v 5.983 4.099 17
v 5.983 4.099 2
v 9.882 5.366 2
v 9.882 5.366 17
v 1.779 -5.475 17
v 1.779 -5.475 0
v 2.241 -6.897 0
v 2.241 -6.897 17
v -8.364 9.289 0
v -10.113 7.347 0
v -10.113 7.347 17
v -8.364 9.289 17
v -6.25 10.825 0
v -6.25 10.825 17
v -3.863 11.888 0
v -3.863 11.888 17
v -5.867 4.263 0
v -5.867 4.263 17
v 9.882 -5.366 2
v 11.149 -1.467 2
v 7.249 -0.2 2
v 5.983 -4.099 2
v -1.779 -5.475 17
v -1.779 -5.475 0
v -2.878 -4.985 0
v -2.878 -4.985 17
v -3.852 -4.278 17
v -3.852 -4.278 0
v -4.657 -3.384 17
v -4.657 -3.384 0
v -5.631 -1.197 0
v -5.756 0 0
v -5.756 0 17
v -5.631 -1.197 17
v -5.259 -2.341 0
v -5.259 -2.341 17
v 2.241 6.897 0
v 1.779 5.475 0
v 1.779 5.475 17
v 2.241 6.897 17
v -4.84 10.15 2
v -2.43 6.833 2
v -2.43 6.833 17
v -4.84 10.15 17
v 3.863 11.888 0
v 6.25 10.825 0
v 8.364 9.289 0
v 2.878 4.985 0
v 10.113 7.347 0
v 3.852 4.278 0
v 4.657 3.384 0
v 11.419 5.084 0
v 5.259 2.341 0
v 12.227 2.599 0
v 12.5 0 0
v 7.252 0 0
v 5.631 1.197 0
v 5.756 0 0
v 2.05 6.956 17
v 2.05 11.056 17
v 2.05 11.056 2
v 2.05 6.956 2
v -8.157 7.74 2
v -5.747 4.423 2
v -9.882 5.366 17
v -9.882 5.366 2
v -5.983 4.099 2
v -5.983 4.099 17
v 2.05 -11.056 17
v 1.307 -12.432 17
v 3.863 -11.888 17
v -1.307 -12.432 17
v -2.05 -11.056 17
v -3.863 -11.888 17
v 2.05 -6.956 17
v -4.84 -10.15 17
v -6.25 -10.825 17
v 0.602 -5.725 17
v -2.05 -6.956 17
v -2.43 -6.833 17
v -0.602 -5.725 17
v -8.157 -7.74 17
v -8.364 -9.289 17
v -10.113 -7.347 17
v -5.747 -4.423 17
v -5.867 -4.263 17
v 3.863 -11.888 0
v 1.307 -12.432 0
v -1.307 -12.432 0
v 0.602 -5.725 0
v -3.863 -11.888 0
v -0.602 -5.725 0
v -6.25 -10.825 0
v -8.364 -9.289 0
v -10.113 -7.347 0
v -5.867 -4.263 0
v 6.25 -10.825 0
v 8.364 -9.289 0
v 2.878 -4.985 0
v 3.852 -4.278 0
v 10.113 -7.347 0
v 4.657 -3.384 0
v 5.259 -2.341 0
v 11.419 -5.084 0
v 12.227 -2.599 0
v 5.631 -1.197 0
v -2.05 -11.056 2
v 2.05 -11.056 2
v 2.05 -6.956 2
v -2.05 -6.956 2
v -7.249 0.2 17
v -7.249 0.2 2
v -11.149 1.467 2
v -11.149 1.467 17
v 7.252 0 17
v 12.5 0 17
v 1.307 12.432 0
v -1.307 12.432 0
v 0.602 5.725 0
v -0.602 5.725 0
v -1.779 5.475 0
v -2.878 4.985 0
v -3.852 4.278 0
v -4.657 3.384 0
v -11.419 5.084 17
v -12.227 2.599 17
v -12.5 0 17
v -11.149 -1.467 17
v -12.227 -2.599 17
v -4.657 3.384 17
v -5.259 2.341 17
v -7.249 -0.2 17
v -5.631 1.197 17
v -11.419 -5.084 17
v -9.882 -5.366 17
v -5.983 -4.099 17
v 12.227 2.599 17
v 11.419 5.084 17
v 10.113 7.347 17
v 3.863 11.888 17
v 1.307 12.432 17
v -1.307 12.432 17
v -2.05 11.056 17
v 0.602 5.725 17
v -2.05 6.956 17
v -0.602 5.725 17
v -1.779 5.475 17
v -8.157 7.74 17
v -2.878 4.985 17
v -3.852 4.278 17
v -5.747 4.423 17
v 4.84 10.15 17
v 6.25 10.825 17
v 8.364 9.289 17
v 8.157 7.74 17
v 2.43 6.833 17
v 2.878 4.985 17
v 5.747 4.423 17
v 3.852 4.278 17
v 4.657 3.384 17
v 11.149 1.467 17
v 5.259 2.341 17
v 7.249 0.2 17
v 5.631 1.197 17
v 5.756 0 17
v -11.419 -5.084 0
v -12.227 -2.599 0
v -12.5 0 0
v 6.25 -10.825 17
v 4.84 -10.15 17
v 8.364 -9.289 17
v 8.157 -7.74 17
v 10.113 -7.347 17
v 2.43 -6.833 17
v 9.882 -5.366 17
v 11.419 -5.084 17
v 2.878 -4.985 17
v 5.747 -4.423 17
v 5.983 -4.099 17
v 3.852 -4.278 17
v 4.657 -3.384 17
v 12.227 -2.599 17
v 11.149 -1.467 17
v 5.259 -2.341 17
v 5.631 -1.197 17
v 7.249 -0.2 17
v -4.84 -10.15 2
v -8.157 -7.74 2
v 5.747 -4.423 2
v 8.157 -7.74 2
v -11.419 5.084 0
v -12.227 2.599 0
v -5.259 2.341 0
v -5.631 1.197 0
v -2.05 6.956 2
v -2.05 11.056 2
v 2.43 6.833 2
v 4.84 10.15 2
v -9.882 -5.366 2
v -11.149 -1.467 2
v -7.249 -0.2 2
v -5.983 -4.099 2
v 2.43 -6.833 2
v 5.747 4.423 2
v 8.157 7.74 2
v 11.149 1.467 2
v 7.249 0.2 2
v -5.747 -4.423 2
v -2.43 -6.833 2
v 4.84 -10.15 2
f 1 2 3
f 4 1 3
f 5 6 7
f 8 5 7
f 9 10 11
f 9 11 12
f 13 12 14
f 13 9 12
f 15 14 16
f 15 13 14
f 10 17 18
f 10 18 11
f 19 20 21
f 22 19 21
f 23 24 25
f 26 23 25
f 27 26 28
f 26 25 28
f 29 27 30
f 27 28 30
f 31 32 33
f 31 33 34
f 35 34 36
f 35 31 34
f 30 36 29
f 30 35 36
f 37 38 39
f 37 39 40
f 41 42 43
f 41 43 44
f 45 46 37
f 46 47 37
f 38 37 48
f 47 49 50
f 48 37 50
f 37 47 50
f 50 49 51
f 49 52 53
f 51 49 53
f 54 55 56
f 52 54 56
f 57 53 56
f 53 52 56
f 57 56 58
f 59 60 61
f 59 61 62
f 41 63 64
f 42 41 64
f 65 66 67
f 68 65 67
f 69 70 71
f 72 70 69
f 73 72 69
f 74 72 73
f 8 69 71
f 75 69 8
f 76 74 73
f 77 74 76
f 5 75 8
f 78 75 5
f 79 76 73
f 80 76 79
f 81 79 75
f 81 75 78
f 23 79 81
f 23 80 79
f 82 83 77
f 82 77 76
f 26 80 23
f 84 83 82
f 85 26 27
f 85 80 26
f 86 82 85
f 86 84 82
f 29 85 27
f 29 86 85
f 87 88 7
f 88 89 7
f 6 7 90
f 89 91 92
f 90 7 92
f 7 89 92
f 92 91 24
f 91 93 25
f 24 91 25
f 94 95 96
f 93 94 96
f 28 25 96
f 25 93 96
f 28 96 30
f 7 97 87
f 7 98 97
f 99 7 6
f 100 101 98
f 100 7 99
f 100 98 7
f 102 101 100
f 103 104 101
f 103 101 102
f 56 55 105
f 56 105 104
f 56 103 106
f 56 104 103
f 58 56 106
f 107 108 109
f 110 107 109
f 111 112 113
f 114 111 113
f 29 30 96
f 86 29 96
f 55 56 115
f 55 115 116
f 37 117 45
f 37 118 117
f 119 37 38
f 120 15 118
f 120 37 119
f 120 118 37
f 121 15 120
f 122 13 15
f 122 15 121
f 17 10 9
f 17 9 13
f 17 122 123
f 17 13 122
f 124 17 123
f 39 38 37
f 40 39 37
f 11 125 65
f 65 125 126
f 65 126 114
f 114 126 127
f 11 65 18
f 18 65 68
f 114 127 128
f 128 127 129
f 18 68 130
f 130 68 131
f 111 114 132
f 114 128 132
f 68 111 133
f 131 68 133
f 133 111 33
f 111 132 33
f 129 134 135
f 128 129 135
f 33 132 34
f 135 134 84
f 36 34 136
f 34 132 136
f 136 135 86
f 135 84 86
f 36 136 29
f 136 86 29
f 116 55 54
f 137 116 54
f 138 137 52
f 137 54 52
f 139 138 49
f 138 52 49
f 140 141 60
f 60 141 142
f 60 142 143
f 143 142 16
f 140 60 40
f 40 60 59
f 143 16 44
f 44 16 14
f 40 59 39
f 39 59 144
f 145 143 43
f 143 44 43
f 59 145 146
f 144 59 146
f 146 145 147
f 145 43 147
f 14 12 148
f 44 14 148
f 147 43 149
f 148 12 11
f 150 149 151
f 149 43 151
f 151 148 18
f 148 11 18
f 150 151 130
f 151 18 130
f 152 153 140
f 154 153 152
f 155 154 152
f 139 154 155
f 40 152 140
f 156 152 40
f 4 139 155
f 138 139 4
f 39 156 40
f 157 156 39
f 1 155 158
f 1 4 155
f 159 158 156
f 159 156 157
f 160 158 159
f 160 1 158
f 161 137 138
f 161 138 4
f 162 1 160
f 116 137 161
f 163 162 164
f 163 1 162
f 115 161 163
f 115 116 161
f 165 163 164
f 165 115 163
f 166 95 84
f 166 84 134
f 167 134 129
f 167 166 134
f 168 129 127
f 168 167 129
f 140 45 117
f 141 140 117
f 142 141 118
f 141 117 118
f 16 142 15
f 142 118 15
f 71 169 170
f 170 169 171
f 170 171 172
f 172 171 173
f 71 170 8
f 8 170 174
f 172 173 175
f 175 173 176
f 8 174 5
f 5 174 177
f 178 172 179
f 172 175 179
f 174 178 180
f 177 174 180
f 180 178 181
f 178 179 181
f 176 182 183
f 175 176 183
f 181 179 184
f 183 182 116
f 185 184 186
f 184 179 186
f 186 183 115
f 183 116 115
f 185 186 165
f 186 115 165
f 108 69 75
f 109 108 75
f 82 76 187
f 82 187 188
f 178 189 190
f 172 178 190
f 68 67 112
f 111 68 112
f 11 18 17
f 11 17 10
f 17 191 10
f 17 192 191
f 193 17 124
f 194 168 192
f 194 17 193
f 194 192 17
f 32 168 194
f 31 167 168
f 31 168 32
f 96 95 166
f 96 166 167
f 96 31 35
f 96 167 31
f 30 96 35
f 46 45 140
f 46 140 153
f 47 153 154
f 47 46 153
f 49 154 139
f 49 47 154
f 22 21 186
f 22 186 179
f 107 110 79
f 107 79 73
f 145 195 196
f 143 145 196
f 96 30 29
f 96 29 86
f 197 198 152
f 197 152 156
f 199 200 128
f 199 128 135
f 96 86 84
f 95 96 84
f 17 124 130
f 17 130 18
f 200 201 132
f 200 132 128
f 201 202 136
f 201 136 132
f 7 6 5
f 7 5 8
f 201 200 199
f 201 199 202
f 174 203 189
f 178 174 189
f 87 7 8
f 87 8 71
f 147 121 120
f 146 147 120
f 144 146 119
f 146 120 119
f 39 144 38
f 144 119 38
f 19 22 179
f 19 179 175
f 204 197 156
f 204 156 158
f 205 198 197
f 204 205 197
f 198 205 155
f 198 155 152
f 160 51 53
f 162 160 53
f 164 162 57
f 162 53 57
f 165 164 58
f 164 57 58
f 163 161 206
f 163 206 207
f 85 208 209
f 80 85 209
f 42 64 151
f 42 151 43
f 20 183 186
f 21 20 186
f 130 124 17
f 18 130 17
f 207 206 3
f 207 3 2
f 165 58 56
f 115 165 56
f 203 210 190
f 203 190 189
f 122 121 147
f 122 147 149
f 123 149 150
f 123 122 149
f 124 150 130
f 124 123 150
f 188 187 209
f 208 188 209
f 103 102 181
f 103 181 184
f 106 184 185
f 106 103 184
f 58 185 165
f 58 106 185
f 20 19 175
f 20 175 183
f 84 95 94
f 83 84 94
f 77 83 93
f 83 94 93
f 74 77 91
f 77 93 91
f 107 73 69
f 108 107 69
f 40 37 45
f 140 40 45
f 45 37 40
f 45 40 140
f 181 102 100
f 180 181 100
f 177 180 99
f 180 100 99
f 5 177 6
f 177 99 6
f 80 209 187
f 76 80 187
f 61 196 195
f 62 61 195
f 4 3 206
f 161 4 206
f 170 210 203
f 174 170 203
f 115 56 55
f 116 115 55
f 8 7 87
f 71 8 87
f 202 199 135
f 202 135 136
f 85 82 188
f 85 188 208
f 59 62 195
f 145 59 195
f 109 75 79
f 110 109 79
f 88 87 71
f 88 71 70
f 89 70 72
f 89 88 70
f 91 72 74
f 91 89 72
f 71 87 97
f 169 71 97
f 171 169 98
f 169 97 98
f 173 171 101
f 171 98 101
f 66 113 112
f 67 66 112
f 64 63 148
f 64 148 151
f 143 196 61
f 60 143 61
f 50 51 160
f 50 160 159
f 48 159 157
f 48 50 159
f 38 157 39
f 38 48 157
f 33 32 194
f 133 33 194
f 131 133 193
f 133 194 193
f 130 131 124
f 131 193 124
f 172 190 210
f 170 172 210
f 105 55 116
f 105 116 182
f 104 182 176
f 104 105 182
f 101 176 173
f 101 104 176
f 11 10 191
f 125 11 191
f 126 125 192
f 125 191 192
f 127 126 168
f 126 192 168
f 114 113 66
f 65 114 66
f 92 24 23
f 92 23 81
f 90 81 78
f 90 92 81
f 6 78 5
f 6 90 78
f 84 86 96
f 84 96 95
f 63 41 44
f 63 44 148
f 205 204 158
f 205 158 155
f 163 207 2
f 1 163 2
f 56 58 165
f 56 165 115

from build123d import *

# Parameters (mm, degrees)
F1_DEPTH = 17
F2_DEPTH = 2


with BuildPart() as f1:
    # F0 (on Top) → F1 (new body)
    with BuildSketch(Plane.XY):
        with BuildLine():
            Line((-9.8818381012, 5.3663013937), (-5.9825063844, 4.0993317168))
            ThreePointArc((-5.9825063844, 4.0993317168), (-5.9254070532, 4.1814416674), (-5.8671808417, 4.262756401))
            Line((-5.8671808417, 4.262756401), (-10.1127124297, 7.3473156537))
            ThreePointArc((-10.1127124297, 7.3473156537), (-11.8882064537, 3.8627124297), (-12.5, 0))
            Line((-12.5, 0), (-7.2522343566, 0))
            ThreePointArc((-7.2522343566, 0), (-7.25154475, 0.1000095098), (-7.2494760613, 0.2))
            Line((-7.2494760613, 0.2), (-11.1488077781, 1.4669696769))
            Line((-11.1488077781, 1.4669696769), (-9.8818381012, 5.3663013937))
        make_face()
        with BuildLine():
            ThreePointArc((-5.8671808417, 4.262756401), (-5.9254070532, 4.1814416674), (-5.9825063844, 4.0993317168))
            Line((-5.9825063844, 4.0993317168), (-7.2494760613, 0.2))
            ThreePointArc((-7.2494760613, 0.2), (-7.25154475, 0.1000095098), (-7.2522343566, 0))
            Line((-7.2522343566, 0), (-5.7564648467, 0))
            ThreePointArc((-5.7564648467, 0), (-5.4747234033, 1.7788454652), (-4.6570778885, 3.3835651422))
            Line((-4.6570778885, 3.3835651422), (-5.8671808417, 4.262756401))
        make_face()
    extrude(amount=F1_DEPTH)

    # F0 (on Top) → F2 (join)
    with BuildSketch(Plane.XY):
        with BuildLine():
            ThreePointArc((-7.2494760613, 0.2), (-6.8972847426, 2.2410636634), (-5.9825063844, 4.0993317168))
            Line((-5.9825063844, 4.0993317168), (-9.8818381012, 5.3663013937))
            Line((-9.8818381012, 5.3663013937), (-11.1488077781, 1.4669696769))
            Line((-11.1488077781, 1.4669696769), (-7.2494760613, 0.2))
        make_face()
        with BuildLine():
            Line((-7.2494760613, 0.2), (-5.9825063844, 4.0993317168))
            ThreePointArc((-5.9825063844, 4.0993317168), (-6.8972847426, 2.2410636634), (-7.2494760613, 0.2))
        make_face()
    extrude(amount=F2_DEPTH)

    # F3: F1 across plane


with BuildPart() as f1_1:
    add(f1.part)
    add(f1.part.mirror(Plane.XZ))


with BuildPart() as f4_1:
    # F4: instance of F1
    add(f1_1.part.mirror(Plane(origin=(-7.3848951591, -5.3654403979, 8.5), x_dir=(0.8090169944, 0.5877852523, 0), z_dir=(0.5877852523, -0.8090169944, 0))))


with BuildPart() as f5_1:
    # F5: instance of F4_1
    add(f4_1.part.mirror(Plane(origin=(2.8207789474, -8.6814649285, 8.5), x_dir=(-0.3090169944, 0.9510565163, 0), z_dir=(0.9510565163, 0.3090169944, 0))))


with BuildPart() as f6_1:
    # F6: instance of F5_1
    add(f5_1.part.mirror(Plane(origin=(9.1282324234, 0, 8.5), x_dir=(-1, 0, 0), z_dir=(0, 1, 0))))


with BuildPart() as f7_1:
    # F7: instance of F6_1
    add(f6_1.part.mirror(Plane(origin=(2.8207789474, 8.6814649285, 8.5), x_dir=(-0.3090169944, -0.9510565163, 0), z_dir=(-0.9510565163, 0.3090169944, 0))))


solid = Compound([f1_1.part, f4_1.part, f5_1.part, f6_1.part, f7_1.part])
